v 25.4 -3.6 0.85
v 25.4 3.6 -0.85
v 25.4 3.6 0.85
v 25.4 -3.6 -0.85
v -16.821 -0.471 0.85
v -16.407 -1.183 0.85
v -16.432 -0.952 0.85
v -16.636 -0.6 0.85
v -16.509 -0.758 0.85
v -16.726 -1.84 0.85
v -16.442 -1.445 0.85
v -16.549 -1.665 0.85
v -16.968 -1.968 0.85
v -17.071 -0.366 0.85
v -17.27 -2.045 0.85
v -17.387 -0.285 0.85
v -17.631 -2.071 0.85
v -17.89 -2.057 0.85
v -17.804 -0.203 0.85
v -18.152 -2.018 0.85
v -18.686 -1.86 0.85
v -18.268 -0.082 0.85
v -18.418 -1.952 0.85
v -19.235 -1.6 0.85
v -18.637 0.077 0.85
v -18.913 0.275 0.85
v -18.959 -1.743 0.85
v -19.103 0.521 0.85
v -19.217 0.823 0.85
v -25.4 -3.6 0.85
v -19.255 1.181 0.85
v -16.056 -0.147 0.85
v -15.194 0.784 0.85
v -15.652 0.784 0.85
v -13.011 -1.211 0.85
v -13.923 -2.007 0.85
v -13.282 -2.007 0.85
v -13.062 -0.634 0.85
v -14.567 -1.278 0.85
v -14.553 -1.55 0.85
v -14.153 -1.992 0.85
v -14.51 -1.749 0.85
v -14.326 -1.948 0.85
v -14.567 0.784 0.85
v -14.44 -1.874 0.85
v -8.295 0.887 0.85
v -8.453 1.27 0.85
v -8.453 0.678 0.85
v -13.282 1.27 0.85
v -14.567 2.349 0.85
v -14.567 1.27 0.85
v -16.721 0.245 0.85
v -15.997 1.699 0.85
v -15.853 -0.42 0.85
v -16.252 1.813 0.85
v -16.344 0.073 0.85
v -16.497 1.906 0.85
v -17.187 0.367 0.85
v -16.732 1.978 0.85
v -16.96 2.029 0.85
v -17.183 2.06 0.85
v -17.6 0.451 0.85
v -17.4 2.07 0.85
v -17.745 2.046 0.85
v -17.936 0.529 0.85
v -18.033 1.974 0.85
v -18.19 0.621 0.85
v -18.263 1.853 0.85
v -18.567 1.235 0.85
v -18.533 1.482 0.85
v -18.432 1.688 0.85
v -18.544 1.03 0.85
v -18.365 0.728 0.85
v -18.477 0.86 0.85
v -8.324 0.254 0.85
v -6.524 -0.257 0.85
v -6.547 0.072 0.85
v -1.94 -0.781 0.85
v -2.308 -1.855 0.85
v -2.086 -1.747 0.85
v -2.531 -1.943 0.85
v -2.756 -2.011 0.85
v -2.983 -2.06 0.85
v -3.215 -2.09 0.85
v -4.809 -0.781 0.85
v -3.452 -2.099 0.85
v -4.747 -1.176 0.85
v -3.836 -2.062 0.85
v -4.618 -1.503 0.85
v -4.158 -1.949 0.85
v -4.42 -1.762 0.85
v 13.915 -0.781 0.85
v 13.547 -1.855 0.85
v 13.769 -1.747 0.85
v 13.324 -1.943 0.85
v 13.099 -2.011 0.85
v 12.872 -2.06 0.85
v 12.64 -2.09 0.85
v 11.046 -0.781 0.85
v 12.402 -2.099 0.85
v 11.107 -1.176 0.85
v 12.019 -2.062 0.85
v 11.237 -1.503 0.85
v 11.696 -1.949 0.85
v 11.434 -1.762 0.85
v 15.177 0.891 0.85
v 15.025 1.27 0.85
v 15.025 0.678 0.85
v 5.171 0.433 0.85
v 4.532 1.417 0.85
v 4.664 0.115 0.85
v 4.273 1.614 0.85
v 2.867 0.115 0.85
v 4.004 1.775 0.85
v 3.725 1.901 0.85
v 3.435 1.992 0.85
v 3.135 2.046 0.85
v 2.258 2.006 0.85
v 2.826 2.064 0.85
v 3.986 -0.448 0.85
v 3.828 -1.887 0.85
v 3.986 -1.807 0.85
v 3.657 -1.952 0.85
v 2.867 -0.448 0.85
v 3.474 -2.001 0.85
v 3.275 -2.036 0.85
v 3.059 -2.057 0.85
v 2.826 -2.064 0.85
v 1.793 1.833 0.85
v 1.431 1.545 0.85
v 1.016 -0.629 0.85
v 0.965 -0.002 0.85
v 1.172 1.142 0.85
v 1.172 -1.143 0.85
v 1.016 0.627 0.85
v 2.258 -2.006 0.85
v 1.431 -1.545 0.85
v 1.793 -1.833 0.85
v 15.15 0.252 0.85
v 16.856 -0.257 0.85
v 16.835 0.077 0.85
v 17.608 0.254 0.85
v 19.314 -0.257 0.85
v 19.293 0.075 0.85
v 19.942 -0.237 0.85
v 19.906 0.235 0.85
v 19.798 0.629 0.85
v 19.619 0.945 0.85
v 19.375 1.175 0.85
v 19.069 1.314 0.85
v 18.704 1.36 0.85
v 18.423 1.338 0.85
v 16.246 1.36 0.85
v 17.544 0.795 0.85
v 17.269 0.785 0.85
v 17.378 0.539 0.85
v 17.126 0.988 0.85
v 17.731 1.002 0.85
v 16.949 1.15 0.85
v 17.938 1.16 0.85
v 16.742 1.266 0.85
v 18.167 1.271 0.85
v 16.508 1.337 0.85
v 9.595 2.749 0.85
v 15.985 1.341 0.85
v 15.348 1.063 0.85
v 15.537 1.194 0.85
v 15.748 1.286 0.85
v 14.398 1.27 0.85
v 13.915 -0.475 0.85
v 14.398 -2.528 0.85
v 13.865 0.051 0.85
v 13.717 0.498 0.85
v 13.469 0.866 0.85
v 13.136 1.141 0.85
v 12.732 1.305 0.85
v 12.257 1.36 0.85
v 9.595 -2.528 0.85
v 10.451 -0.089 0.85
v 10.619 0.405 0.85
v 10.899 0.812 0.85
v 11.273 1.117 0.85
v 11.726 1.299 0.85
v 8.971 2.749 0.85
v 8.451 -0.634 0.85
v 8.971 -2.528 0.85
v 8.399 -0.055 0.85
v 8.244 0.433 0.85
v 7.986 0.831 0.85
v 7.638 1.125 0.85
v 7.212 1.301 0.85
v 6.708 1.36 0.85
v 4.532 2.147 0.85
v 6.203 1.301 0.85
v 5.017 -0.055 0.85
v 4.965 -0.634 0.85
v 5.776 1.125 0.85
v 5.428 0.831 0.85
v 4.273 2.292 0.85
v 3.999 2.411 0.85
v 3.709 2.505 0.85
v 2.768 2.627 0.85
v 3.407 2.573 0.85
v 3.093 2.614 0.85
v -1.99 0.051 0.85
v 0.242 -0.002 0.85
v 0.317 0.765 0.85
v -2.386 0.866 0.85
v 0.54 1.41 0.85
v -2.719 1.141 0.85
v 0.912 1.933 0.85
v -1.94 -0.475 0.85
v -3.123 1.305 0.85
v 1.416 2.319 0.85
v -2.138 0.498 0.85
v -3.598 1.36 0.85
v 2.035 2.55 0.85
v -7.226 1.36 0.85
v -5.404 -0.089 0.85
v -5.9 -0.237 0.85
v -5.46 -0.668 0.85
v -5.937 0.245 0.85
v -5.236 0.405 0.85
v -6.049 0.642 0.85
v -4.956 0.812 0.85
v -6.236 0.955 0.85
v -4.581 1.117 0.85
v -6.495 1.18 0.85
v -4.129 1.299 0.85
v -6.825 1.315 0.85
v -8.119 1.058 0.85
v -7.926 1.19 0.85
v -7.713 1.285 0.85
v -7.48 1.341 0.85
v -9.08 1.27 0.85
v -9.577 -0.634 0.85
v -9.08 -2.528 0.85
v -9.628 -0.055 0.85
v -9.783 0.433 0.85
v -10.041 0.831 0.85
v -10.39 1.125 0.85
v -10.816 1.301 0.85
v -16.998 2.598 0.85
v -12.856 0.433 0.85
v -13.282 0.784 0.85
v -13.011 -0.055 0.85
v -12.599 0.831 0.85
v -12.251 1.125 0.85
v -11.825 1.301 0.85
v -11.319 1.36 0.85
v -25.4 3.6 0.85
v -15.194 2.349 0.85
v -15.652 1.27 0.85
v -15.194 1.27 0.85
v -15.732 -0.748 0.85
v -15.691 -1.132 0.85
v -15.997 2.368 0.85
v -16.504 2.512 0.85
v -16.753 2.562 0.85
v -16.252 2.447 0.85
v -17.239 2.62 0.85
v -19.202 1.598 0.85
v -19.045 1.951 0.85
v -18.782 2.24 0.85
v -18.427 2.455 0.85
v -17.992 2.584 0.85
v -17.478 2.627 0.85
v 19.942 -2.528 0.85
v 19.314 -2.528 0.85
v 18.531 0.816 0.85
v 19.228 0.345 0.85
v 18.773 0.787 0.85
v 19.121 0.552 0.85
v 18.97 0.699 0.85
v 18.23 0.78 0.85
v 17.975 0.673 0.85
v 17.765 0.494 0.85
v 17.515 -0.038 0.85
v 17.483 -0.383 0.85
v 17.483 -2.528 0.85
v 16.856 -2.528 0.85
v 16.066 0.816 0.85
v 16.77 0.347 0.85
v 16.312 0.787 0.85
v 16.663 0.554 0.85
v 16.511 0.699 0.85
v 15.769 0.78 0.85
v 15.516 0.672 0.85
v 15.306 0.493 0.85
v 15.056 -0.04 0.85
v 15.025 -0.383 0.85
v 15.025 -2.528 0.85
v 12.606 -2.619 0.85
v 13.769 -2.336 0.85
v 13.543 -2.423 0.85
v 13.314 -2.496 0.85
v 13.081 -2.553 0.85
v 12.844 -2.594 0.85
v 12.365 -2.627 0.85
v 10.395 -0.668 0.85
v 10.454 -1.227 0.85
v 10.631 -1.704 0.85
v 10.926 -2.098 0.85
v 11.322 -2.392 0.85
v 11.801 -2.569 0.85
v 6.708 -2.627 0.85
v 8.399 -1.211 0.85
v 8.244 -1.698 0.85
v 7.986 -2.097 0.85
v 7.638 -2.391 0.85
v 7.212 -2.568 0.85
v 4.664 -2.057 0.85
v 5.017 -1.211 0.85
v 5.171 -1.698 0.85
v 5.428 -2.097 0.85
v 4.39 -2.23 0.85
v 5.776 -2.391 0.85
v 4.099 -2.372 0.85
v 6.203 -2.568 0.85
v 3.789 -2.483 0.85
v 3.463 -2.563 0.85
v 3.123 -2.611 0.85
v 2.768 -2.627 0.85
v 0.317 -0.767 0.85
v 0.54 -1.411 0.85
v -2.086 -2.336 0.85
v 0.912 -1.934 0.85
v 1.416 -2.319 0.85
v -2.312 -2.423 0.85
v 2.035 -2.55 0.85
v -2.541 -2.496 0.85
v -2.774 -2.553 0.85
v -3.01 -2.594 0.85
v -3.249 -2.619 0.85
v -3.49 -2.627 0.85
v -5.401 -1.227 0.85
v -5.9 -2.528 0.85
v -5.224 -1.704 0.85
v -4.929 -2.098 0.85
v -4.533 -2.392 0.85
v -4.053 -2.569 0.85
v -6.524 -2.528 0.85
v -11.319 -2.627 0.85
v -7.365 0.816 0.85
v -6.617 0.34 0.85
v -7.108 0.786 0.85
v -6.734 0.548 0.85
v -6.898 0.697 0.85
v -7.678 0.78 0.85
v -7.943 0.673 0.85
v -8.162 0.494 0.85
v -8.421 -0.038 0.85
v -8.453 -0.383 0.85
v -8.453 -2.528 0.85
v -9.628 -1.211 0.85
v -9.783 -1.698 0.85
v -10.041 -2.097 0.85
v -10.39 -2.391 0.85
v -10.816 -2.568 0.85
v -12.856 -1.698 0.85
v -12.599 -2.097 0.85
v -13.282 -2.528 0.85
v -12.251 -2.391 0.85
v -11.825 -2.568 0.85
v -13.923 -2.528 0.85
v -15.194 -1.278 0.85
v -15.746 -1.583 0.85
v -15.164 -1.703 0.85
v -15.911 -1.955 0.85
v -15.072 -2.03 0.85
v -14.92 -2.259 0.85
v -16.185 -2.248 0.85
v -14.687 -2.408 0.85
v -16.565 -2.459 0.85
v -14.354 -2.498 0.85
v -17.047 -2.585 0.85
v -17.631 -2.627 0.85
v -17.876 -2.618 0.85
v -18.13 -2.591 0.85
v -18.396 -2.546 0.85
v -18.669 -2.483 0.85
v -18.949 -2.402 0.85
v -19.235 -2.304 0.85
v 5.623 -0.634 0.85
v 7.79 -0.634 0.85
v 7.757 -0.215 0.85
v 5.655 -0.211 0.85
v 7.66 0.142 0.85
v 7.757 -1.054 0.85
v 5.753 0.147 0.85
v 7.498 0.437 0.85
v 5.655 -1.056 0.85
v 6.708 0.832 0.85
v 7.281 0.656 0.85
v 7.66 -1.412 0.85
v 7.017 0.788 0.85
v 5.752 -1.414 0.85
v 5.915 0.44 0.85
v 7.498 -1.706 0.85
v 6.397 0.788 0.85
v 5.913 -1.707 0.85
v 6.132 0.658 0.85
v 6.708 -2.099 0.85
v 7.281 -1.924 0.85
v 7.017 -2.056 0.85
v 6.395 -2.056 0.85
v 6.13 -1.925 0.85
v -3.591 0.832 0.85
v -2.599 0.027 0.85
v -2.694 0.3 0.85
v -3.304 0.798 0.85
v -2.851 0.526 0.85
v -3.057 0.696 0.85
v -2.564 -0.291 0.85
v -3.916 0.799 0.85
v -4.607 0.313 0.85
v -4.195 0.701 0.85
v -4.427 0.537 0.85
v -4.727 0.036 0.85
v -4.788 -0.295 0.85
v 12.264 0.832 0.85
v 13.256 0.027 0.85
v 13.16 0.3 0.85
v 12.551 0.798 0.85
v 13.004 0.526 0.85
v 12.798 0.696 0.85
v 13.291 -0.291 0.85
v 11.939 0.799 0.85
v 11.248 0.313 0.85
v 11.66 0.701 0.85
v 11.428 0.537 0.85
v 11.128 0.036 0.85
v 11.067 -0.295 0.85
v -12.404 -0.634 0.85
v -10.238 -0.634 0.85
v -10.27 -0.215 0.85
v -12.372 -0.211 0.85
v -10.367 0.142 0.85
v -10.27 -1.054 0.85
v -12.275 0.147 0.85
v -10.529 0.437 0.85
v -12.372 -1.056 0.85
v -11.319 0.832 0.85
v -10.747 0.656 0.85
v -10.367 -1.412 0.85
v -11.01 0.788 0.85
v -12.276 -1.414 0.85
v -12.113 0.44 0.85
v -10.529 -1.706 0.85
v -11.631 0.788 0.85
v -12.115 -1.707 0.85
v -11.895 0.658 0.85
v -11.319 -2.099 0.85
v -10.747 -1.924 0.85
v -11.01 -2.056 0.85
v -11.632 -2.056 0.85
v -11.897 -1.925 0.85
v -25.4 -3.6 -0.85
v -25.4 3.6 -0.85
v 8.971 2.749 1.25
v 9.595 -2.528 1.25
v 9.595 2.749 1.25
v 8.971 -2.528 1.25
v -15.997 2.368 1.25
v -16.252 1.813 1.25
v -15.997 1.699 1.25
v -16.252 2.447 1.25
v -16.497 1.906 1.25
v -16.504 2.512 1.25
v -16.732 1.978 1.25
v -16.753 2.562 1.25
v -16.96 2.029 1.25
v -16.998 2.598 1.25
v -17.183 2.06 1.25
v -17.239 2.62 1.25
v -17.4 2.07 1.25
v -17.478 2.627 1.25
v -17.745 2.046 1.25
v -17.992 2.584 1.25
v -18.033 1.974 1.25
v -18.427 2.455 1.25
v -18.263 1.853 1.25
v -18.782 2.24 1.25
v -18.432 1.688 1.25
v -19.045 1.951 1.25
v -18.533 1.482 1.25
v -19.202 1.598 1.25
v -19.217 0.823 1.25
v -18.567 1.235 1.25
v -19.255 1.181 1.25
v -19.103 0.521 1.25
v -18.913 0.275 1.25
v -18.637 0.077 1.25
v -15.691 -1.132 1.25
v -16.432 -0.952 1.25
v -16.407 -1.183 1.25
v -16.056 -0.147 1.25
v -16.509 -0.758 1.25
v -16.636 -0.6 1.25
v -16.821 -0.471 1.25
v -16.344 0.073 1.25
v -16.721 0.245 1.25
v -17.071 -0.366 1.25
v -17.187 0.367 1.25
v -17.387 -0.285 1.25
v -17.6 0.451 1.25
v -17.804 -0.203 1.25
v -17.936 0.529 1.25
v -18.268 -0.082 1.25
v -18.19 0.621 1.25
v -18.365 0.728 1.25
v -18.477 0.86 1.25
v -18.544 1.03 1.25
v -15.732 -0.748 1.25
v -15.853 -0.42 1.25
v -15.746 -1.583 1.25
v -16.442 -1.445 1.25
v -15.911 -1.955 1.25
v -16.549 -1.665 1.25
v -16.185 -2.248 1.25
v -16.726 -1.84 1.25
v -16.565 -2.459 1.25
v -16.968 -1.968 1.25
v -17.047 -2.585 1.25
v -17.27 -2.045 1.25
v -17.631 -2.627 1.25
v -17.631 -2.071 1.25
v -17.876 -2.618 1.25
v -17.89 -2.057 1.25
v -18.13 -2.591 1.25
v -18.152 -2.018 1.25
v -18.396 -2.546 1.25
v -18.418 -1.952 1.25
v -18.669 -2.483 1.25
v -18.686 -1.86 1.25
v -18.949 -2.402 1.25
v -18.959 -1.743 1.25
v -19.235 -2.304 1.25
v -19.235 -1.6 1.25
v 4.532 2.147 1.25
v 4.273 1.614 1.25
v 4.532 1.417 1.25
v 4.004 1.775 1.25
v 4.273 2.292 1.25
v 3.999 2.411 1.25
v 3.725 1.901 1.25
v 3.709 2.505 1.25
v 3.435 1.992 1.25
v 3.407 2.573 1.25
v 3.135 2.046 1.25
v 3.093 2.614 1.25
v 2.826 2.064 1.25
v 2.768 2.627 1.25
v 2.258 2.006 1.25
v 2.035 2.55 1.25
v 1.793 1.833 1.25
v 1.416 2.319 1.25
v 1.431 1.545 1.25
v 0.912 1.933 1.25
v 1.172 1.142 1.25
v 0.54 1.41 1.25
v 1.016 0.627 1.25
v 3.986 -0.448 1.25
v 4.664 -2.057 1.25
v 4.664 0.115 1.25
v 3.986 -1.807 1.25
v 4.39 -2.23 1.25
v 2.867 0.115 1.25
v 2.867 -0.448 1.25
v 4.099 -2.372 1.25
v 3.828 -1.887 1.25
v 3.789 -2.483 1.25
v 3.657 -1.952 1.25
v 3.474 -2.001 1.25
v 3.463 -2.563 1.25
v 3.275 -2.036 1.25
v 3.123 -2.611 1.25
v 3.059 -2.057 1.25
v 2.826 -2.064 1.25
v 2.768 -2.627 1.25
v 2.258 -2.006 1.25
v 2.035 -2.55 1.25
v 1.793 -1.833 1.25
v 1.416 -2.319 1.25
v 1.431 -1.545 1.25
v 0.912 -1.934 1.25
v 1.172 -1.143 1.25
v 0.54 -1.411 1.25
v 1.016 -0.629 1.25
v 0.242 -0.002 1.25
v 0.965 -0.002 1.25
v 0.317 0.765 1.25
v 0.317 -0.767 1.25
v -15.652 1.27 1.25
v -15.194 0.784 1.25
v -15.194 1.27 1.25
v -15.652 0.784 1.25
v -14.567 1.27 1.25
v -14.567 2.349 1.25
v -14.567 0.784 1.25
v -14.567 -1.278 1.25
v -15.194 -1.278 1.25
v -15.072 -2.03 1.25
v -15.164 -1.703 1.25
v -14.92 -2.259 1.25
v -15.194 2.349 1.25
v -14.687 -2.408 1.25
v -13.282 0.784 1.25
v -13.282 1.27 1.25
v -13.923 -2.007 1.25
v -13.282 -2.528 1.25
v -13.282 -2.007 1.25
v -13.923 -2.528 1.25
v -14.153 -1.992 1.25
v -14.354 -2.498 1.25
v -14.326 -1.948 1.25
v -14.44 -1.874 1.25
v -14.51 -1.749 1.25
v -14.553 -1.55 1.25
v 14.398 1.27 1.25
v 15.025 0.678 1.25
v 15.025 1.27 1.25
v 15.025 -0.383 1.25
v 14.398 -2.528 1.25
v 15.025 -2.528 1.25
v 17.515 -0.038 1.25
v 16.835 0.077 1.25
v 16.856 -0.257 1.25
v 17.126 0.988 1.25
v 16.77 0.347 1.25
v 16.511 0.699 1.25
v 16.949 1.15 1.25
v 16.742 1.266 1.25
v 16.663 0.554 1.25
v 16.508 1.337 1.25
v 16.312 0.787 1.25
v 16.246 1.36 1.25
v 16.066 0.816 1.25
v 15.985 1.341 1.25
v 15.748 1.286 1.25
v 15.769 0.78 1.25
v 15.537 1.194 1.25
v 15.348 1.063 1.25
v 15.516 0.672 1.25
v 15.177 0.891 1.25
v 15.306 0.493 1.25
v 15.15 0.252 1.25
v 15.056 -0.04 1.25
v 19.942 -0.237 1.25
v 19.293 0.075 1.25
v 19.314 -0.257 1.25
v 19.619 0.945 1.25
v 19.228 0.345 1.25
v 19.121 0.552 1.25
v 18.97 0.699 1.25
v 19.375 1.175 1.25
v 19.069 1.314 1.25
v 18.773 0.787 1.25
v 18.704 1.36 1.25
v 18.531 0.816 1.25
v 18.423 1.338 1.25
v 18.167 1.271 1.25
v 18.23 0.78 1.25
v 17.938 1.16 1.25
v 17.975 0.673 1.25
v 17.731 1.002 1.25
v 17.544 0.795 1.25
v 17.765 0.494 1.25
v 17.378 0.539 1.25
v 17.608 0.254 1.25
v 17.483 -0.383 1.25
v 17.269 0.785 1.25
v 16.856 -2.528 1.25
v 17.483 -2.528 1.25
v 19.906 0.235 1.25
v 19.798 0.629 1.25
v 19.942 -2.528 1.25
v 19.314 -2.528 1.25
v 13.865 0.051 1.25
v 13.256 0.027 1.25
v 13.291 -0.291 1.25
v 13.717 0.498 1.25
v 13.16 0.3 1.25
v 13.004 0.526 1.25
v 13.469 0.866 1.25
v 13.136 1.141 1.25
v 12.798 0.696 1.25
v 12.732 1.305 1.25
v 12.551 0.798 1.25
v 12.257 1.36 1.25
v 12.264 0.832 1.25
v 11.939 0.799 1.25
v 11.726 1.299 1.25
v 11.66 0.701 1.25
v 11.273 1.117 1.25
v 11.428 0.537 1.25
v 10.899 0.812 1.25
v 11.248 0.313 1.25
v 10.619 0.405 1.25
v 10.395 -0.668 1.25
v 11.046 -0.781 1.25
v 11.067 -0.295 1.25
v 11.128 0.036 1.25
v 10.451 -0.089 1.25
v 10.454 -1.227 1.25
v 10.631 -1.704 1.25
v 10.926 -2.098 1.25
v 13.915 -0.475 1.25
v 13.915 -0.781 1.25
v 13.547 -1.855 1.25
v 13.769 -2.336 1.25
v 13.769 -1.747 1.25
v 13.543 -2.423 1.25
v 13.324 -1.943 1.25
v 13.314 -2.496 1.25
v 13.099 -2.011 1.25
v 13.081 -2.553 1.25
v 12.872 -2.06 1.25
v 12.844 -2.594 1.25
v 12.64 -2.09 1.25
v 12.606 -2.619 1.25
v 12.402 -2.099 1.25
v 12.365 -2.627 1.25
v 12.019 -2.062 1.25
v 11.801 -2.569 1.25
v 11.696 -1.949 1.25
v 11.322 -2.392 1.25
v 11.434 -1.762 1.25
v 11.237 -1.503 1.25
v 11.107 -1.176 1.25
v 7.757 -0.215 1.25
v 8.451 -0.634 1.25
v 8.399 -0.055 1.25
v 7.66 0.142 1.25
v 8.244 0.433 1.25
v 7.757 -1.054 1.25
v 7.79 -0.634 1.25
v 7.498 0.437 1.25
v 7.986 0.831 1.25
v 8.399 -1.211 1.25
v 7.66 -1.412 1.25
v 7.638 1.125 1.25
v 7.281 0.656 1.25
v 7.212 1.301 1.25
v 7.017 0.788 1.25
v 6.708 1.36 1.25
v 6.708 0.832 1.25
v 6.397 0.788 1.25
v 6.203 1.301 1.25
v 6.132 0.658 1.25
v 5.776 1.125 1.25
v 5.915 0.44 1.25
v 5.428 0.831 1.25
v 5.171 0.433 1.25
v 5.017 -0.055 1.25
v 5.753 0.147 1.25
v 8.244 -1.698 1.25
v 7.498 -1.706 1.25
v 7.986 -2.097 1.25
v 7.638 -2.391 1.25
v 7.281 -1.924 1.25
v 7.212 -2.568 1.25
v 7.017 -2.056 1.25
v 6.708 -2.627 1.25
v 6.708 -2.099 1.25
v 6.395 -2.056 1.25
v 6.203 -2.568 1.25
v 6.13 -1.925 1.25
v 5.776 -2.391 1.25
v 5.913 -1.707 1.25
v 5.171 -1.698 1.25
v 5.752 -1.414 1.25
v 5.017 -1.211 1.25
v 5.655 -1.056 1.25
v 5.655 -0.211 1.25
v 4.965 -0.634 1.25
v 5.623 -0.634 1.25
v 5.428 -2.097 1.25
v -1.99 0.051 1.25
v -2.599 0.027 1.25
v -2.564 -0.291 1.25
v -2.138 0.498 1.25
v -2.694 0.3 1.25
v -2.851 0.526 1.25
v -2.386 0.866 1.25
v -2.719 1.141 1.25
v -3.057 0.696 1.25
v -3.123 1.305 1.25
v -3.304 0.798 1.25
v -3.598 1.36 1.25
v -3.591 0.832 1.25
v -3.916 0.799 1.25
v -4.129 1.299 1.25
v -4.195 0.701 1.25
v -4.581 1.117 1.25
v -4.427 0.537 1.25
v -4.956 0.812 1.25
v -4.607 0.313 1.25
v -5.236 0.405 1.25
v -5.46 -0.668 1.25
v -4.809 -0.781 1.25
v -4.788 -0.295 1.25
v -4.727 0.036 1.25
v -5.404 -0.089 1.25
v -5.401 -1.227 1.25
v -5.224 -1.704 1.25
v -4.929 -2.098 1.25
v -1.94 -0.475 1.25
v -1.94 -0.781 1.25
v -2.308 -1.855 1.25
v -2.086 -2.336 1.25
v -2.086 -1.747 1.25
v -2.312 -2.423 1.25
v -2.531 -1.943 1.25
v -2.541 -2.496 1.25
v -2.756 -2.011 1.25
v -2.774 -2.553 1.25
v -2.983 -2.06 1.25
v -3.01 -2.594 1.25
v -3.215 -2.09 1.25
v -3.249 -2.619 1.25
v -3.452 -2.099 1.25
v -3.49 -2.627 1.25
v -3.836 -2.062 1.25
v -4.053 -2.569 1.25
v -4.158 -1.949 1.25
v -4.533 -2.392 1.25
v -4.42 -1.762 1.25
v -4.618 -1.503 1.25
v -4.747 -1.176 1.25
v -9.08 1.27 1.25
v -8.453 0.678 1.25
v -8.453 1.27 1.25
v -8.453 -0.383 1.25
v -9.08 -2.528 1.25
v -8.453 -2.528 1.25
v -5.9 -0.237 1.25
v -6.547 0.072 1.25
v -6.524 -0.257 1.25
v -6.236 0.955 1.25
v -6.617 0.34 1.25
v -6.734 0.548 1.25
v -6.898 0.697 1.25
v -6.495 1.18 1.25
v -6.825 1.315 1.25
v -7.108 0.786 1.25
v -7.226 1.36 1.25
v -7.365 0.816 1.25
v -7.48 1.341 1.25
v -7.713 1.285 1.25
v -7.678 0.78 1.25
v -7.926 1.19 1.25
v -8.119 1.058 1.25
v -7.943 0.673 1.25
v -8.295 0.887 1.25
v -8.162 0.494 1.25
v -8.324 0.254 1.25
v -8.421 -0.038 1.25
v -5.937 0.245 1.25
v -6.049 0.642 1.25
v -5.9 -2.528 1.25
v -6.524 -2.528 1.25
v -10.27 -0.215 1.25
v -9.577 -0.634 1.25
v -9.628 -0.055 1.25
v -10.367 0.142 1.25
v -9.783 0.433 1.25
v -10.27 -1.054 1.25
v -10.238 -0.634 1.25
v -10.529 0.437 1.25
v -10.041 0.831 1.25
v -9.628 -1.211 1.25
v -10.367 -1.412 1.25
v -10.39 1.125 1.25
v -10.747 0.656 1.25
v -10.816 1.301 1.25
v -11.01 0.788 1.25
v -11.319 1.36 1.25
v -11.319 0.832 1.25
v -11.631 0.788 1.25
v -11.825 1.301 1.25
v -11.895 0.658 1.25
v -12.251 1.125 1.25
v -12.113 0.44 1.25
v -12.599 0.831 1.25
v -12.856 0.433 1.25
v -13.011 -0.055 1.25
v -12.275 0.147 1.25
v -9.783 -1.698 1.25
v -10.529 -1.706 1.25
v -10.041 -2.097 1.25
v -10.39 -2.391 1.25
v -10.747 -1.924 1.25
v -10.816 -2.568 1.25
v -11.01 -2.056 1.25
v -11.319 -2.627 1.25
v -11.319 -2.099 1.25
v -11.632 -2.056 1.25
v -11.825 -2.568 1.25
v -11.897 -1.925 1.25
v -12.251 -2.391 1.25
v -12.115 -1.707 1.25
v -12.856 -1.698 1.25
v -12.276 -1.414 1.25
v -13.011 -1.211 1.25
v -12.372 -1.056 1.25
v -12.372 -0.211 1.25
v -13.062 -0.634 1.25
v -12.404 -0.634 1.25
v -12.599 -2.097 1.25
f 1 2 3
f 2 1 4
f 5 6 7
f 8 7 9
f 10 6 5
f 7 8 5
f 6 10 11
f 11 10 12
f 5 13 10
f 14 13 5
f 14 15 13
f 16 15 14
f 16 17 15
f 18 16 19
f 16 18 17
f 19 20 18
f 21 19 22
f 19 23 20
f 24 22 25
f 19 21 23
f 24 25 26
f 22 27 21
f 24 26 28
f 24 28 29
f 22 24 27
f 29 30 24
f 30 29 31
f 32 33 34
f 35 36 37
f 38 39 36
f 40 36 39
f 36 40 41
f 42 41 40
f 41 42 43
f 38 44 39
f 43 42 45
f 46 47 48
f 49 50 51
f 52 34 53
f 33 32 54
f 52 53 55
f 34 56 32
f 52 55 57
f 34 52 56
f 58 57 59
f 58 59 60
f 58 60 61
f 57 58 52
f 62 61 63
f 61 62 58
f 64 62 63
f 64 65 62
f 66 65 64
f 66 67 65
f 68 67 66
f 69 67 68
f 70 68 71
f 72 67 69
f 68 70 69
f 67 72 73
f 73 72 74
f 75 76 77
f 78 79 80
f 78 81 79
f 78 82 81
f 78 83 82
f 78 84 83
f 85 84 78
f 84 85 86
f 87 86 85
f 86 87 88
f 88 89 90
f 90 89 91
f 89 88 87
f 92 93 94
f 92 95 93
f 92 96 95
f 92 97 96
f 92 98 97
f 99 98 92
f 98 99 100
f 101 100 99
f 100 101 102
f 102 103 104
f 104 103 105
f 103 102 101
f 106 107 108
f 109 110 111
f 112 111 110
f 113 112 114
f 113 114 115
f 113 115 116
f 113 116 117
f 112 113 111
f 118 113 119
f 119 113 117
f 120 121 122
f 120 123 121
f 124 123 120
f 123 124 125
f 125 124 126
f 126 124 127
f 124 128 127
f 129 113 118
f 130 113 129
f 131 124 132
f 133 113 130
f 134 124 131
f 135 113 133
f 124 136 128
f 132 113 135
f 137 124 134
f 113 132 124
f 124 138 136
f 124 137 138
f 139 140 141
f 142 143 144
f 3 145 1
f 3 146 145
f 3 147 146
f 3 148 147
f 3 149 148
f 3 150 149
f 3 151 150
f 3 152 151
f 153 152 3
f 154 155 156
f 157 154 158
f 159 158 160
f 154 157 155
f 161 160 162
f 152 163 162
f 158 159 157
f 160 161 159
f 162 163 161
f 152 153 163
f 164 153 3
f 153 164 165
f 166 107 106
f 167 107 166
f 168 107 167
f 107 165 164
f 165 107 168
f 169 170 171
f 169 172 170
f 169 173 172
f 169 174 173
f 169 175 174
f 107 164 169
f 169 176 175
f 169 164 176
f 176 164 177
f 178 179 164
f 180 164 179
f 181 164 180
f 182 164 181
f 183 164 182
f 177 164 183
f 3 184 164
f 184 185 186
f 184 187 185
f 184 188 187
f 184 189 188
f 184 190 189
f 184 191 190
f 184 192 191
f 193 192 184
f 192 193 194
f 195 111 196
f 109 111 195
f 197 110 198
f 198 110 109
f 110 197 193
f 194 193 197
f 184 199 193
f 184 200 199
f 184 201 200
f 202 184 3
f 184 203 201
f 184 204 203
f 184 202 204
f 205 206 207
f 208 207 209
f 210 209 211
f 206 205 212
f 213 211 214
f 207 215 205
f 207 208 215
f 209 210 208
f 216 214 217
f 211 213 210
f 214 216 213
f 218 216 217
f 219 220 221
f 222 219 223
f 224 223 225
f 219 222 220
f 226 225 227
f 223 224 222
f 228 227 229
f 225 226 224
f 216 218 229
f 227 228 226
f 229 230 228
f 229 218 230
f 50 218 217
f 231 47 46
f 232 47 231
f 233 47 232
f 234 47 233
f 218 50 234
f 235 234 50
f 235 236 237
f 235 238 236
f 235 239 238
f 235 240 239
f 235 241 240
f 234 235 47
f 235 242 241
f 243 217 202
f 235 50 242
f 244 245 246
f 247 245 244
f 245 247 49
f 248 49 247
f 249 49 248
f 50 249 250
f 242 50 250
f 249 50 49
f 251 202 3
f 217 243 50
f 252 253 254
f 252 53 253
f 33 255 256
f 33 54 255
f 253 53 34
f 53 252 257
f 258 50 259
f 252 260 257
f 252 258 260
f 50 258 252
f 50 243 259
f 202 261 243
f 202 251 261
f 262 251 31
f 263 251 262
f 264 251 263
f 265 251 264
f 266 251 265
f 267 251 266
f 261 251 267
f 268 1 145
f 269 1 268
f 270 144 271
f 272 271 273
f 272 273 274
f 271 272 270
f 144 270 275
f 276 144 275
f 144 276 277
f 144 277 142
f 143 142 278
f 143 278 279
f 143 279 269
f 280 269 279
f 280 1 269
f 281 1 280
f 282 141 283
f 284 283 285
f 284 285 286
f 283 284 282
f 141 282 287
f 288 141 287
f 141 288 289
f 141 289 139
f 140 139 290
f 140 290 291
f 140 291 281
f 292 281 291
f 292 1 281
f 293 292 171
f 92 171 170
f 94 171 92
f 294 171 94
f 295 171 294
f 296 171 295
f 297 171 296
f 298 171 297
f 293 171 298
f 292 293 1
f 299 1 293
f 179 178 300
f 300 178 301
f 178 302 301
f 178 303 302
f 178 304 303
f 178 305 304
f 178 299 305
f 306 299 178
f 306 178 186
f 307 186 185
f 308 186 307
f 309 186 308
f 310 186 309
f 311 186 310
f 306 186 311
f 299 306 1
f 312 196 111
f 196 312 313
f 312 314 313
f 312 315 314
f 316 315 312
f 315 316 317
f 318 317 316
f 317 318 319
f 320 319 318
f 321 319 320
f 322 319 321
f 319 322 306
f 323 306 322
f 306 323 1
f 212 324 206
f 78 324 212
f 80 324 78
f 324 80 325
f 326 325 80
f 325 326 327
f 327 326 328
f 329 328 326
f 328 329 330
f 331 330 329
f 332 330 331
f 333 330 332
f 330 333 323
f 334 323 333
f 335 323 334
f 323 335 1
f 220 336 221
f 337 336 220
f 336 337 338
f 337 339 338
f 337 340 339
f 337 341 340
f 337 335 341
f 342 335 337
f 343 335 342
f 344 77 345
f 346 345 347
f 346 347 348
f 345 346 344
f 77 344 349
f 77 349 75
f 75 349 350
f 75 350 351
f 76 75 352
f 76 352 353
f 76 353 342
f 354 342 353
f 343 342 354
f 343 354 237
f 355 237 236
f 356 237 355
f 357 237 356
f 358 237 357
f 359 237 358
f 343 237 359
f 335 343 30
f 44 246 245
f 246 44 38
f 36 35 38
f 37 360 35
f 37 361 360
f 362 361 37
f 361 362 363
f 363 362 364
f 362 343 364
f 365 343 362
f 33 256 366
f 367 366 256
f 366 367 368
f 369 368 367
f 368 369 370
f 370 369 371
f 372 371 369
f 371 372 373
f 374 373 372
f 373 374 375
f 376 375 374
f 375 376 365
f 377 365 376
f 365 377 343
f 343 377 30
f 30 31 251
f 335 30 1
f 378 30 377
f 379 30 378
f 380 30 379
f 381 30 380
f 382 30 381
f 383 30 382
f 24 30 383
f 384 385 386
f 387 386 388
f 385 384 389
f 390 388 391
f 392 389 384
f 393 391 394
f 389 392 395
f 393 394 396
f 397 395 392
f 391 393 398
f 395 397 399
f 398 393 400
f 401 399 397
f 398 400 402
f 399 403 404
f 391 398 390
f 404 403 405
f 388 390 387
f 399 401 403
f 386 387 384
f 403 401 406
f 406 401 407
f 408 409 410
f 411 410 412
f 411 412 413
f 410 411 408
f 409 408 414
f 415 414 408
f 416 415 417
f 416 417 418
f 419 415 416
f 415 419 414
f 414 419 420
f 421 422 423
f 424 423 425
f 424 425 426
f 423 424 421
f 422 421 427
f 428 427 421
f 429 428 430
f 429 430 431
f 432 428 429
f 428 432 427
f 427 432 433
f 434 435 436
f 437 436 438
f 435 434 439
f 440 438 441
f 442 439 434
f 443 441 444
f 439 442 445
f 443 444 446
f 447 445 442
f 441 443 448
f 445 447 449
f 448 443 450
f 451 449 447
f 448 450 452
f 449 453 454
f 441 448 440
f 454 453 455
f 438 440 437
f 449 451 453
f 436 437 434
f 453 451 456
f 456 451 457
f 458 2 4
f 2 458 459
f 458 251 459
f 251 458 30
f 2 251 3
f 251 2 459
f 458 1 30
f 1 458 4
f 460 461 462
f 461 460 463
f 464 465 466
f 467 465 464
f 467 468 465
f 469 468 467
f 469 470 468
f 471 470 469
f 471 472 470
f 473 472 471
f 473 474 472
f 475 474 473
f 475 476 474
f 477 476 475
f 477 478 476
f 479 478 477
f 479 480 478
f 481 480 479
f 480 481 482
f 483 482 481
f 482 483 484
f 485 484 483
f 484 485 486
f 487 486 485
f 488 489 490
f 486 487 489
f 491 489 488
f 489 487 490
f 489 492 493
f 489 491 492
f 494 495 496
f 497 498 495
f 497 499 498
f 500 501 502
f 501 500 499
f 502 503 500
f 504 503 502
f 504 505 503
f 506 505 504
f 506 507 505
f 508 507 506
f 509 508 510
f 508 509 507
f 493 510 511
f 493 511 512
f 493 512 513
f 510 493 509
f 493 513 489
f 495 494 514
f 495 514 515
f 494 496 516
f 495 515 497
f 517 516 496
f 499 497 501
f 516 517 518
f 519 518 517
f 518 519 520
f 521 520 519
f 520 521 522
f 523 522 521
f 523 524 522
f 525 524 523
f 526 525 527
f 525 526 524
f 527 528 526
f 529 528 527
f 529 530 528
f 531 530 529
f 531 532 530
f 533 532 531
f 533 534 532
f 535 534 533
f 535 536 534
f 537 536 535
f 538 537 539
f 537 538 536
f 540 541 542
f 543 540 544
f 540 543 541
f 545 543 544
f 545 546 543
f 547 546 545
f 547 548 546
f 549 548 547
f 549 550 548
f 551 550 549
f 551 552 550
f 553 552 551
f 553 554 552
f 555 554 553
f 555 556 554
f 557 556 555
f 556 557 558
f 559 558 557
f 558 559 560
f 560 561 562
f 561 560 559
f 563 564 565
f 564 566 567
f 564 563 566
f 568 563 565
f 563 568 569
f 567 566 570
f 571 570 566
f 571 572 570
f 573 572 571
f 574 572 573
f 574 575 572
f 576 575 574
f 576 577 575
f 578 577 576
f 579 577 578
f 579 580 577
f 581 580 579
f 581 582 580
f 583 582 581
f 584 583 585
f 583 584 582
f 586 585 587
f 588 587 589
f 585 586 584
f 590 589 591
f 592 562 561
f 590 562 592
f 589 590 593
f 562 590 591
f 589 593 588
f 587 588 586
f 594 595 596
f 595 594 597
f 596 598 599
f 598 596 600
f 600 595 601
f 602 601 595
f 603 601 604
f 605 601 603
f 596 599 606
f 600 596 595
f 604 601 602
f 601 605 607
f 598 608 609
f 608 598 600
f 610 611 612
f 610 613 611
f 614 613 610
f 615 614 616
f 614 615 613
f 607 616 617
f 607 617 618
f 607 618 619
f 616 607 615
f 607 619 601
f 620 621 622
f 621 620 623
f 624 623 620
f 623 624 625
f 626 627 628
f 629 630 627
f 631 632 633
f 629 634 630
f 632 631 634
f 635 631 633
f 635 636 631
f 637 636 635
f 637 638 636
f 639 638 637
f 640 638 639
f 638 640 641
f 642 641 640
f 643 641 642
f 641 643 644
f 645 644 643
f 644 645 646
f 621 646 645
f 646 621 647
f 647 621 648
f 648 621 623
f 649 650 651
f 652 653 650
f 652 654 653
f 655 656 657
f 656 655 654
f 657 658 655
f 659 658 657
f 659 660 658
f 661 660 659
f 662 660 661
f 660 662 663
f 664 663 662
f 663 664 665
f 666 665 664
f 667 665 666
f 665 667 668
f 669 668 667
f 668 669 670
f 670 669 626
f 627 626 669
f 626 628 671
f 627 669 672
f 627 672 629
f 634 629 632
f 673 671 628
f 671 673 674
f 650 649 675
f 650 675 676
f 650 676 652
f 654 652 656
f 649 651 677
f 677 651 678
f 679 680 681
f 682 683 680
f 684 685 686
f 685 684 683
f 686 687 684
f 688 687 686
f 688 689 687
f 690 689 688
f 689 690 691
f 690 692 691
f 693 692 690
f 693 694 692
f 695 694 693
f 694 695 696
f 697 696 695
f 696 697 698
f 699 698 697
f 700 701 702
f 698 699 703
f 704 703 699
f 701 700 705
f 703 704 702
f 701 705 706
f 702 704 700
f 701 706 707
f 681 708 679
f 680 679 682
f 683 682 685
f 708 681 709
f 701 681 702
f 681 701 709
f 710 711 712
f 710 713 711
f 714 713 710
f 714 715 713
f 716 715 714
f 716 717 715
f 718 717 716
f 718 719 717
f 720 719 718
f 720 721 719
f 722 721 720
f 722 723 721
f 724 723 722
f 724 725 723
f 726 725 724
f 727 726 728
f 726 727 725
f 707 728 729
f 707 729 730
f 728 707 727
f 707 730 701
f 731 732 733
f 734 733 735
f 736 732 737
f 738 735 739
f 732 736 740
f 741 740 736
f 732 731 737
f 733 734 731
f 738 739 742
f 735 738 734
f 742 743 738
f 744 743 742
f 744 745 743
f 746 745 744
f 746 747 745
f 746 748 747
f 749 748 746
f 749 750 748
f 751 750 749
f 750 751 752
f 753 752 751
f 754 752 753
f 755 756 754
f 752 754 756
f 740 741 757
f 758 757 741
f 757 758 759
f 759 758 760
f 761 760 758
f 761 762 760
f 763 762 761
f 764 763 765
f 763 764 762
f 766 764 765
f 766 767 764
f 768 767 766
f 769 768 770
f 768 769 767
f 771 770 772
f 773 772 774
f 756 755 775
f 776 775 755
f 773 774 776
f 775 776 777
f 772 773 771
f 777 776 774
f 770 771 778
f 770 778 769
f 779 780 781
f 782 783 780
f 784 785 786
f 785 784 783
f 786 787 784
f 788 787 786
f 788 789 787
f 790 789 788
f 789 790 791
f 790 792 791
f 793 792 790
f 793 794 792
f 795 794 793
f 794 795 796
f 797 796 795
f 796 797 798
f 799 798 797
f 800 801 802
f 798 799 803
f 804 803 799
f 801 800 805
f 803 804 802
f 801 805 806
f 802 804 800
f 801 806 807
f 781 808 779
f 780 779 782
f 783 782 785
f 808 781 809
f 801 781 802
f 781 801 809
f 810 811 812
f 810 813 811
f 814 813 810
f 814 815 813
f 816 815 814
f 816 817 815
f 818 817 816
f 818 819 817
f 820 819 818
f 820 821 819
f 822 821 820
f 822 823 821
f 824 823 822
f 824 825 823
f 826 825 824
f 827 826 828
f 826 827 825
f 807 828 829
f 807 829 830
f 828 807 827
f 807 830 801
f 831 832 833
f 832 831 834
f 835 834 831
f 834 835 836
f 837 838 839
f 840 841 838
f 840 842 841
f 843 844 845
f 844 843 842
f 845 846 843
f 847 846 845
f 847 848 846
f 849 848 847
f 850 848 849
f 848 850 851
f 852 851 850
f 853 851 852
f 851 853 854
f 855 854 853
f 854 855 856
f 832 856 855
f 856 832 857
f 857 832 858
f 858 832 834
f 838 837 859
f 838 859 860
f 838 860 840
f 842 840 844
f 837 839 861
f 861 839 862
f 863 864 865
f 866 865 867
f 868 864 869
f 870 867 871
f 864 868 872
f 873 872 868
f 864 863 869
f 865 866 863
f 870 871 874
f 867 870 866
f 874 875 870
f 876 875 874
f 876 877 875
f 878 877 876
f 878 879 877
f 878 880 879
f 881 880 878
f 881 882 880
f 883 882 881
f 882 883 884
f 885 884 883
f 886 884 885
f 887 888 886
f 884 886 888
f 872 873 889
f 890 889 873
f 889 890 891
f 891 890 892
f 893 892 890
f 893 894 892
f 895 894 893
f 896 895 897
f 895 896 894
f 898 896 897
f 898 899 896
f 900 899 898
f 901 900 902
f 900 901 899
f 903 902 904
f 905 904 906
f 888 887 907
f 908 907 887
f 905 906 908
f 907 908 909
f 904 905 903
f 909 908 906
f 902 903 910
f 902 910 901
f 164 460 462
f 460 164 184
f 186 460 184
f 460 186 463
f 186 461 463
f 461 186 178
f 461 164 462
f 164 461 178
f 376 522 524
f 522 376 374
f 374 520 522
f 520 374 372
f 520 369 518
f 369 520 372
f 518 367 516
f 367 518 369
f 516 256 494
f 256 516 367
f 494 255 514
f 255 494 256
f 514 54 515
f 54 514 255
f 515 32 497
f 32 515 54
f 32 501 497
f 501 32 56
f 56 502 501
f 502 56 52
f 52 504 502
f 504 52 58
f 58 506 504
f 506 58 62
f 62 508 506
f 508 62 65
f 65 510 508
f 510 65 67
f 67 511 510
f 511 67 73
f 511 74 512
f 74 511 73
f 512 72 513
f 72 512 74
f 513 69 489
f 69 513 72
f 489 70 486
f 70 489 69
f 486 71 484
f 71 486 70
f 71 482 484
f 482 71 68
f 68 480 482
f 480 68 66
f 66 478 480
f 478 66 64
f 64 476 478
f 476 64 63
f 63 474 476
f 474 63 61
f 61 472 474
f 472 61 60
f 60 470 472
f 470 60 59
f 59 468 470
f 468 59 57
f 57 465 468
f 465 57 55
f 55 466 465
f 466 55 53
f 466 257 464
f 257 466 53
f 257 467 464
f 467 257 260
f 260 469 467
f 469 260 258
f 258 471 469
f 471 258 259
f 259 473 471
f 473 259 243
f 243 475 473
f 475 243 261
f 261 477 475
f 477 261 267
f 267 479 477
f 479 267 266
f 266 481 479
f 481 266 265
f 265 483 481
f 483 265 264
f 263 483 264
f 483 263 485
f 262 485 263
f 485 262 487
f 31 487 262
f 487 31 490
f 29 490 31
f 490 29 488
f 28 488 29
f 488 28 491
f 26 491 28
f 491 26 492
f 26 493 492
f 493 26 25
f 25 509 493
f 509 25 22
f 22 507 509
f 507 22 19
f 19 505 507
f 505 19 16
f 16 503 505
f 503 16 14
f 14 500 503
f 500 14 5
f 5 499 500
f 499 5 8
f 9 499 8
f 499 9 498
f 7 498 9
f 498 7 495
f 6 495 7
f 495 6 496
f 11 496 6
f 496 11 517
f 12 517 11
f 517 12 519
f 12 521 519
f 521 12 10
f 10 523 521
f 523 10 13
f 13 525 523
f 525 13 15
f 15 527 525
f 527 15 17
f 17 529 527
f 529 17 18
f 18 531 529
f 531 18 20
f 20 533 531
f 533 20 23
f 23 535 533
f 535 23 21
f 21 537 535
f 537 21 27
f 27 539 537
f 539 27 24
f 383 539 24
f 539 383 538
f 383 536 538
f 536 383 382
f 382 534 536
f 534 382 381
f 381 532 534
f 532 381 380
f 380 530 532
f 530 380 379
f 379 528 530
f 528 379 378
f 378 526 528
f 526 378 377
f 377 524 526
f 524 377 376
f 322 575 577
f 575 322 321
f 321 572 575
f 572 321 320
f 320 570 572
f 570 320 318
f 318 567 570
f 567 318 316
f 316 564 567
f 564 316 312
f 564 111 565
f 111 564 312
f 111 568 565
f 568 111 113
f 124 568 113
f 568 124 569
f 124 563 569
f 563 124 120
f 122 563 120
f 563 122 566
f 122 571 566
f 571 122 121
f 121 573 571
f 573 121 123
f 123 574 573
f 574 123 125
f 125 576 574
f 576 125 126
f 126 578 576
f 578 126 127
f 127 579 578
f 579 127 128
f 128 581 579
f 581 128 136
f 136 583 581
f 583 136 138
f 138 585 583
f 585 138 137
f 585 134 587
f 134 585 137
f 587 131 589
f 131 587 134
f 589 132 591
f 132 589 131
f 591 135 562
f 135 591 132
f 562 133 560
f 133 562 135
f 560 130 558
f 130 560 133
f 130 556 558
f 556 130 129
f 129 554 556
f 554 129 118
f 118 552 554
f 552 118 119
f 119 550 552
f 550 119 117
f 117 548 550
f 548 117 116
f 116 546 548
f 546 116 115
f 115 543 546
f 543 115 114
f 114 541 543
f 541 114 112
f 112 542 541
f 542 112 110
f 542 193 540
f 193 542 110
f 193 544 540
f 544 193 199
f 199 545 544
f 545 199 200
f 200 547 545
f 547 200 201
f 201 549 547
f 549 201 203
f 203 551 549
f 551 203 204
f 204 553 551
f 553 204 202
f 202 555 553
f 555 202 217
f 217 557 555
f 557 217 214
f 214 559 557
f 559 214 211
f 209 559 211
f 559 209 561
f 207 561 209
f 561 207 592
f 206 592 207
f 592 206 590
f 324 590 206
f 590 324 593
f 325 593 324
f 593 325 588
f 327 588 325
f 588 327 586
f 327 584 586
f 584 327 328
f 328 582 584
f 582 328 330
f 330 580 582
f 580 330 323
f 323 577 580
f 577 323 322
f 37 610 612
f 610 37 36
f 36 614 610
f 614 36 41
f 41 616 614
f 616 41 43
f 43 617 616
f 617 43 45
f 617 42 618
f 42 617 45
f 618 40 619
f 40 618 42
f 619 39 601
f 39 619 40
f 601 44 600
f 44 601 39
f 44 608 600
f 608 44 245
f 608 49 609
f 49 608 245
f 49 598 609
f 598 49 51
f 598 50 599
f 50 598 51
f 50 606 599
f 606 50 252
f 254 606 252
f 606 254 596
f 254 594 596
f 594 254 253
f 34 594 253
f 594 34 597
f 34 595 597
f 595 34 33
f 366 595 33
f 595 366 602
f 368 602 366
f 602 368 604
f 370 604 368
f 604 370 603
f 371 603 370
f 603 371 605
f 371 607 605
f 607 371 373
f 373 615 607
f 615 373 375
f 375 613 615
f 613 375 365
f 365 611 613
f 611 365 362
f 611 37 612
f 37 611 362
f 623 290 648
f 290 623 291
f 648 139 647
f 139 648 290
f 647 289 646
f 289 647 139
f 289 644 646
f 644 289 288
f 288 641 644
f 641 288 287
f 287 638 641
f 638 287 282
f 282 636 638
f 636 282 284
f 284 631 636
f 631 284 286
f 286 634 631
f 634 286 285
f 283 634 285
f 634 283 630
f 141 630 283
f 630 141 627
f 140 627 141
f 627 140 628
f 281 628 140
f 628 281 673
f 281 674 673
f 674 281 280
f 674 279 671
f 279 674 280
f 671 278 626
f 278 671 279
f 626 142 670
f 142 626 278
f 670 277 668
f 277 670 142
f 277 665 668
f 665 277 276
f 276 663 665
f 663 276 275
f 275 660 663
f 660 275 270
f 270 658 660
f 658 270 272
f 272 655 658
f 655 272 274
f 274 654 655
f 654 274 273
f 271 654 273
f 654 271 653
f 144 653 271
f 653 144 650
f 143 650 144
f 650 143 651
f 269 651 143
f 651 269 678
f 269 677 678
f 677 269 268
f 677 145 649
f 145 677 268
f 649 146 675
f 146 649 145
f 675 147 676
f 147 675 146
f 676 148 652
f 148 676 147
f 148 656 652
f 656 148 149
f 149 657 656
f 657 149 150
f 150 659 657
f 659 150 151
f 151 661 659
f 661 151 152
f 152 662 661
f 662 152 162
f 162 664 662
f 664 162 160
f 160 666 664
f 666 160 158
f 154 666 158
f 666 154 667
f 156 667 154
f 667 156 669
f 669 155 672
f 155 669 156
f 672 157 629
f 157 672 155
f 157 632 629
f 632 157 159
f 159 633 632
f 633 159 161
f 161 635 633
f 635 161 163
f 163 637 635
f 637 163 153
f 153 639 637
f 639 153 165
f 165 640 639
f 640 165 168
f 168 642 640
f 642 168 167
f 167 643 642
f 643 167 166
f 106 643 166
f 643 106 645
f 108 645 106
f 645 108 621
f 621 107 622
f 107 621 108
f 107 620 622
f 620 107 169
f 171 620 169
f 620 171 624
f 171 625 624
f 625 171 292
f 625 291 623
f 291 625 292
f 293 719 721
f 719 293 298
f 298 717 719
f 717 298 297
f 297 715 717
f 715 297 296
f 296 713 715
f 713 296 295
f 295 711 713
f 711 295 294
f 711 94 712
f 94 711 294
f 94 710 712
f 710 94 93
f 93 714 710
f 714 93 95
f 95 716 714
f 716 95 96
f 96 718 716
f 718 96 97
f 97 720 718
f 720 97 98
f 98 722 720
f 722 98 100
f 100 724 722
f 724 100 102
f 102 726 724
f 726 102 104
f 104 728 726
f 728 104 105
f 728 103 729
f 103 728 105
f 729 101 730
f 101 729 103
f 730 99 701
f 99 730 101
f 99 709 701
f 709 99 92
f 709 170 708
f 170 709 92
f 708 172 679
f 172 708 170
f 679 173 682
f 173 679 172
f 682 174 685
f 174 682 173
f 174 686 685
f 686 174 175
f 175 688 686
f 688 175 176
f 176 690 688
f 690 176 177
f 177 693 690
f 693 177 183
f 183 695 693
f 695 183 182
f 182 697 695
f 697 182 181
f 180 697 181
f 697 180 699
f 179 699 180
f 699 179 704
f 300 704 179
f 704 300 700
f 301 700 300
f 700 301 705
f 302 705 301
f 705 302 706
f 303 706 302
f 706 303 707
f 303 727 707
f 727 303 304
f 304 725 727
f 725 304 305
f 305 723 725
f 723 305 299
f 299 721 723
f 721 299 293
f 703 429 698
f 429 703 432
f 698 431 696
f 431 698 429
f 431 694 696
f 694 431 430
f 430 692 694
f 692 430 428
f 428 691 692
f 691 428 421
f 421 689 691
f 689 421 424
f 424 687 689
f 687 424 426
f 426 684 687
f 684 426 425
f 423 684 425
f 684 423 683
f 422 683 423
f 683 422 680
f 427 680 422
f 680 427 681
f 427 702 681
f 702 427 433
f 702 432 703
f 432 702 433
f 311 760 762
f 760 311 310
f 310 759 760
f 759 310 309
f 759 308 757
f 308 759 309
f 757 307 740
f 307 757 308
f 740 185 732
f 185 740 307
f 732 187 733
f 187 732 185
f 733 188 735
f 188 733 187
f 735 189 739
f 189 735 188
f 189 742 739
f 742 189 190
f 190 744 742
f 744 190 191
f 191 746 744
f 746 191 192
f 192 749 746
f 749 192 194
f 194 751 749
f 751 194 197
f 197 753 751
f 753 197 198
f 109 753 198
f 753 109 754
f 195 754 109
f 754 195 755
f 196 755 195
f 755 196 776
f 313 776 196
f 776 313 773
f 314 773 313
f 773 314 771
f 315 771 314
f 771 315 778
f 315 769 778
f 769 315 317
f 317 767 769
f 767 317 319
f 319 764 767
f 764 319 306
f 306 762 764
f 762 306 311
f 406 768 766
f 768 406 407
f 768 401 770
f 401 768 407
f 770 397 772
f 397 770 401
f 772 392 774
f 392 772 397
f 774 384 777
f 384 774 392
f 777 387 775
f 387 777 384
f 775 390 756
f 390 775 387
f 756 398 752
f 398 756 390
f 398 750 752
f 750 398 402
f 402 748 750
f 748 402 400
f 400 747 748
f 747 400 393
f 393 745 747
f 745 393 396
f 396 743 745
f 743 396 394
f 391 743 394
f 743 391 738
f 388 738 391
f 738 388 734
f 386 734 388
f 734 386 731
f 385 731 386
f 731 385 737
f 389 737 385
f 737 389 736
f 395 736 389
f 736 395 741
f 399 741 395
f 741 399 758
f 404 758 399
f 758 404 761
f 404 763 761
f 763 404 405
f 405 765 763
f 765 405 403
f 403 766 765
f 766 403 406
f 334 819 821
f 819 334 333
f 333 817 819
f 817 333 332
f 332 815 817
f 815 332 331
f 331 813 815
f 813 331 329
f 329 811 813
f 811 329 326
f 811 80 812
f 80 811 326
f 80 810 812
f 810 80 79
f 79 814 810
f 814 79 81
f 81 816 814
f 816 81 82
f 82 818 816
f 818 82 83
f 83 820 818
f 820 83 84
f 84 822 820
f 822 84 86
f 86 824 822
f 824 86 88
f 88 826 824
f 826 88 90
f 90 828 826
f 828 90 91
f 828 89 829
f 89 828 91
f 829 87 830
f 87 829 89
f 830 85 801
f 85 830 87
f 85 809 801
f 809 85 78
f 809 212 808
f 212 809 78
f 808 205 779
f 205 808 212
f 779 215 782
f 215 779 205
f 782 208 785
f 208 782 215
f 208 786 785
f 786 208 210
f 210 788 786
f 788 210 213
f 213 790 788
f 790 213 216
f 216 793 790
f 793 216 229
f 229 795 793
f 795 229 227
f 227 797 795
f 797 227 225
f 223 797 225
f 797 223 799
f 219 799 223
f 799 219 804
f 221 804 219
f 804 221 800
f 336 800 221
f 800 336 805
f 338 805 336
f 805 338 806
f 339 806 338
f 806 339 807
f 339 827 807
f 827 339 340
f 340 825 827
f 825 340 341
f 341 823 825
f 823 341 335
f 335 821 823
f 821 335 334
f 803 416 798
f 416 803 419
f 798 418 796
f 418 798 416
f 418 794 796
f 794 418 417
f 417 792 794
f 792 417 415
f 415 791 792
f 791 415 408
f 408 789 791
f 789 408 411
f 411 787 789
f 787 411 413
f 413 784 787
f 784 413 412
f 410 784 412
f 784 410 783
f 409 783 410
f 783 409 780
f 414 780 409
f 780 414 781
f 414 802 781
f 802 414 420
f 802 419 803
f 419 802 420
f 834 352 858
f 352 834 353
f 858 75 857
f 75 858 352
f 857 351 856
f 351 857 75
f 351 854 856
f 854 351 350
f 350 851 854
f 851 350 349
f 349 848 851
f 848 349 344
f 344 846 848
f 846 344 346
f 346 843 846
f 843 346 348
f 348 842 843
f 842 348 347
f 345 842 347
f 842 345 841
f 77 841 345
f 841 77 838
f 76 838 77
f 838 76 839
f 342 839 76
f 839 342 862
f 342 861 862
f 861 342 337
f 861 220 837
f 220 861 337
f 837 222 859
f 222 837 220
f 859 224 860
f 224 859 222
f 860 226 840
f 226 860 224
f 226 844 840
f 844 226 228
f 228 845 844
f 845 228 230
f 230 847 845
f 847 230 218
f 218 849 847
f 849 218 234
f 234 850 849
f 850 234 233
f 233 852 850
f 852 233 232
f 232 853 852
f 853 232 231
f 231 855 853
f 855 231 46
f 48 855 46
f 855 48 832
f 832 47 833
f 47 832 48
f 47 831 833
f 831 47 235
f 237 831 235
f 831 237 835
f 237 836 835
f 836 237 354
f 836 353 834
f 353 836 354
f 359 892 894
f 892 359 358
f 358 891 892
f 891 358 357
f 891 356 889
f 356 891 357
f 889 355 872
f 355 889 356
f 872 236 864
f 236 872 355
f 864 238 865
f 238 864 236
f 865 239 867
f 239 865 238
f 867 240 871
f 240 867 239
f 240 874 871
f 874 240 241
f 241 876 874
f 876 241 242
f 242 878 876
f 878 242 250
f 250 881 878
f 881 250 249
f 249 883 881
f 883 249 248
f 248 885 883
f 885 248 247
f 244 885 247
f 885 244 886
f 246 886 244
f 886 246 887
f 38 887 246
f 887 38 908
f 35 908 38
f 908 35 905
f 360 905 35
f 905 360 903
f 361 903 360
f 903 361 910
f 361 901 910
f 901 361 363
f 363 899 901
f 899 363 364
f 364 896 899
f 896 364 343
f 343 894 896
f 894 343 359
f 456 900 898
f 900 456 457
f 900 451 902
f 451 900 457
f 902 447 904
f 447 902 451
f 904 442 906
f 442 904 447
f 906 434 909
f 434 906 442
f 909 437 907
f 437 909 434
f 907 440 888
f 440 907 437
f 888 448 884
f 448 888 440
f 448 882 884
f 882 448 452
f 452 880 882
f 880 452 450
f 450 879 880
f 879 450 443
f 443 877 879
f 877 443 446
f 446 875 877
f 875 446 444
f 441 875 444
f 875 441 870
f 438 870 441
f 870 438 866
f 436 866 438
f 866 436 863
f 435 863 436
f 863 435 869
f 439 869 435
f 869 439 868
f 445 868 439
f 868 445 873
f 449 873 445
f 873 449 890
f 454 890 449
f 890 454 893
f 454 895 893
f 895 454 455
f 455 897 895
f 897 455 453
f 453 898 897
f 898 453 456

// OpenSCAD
monster_name = "Stone Golem";

cube(size=[50.8, 7.2, 1.7], center=true);
color("BLACK")
    translate([0, 0, 1.7 / 2])
        linear_extrude(height=0.4)
            text(
                monster_name,
                size=5,
                spacing=0.9,
                font="pirataone",
                halign="center",
                valign="center"
            );
